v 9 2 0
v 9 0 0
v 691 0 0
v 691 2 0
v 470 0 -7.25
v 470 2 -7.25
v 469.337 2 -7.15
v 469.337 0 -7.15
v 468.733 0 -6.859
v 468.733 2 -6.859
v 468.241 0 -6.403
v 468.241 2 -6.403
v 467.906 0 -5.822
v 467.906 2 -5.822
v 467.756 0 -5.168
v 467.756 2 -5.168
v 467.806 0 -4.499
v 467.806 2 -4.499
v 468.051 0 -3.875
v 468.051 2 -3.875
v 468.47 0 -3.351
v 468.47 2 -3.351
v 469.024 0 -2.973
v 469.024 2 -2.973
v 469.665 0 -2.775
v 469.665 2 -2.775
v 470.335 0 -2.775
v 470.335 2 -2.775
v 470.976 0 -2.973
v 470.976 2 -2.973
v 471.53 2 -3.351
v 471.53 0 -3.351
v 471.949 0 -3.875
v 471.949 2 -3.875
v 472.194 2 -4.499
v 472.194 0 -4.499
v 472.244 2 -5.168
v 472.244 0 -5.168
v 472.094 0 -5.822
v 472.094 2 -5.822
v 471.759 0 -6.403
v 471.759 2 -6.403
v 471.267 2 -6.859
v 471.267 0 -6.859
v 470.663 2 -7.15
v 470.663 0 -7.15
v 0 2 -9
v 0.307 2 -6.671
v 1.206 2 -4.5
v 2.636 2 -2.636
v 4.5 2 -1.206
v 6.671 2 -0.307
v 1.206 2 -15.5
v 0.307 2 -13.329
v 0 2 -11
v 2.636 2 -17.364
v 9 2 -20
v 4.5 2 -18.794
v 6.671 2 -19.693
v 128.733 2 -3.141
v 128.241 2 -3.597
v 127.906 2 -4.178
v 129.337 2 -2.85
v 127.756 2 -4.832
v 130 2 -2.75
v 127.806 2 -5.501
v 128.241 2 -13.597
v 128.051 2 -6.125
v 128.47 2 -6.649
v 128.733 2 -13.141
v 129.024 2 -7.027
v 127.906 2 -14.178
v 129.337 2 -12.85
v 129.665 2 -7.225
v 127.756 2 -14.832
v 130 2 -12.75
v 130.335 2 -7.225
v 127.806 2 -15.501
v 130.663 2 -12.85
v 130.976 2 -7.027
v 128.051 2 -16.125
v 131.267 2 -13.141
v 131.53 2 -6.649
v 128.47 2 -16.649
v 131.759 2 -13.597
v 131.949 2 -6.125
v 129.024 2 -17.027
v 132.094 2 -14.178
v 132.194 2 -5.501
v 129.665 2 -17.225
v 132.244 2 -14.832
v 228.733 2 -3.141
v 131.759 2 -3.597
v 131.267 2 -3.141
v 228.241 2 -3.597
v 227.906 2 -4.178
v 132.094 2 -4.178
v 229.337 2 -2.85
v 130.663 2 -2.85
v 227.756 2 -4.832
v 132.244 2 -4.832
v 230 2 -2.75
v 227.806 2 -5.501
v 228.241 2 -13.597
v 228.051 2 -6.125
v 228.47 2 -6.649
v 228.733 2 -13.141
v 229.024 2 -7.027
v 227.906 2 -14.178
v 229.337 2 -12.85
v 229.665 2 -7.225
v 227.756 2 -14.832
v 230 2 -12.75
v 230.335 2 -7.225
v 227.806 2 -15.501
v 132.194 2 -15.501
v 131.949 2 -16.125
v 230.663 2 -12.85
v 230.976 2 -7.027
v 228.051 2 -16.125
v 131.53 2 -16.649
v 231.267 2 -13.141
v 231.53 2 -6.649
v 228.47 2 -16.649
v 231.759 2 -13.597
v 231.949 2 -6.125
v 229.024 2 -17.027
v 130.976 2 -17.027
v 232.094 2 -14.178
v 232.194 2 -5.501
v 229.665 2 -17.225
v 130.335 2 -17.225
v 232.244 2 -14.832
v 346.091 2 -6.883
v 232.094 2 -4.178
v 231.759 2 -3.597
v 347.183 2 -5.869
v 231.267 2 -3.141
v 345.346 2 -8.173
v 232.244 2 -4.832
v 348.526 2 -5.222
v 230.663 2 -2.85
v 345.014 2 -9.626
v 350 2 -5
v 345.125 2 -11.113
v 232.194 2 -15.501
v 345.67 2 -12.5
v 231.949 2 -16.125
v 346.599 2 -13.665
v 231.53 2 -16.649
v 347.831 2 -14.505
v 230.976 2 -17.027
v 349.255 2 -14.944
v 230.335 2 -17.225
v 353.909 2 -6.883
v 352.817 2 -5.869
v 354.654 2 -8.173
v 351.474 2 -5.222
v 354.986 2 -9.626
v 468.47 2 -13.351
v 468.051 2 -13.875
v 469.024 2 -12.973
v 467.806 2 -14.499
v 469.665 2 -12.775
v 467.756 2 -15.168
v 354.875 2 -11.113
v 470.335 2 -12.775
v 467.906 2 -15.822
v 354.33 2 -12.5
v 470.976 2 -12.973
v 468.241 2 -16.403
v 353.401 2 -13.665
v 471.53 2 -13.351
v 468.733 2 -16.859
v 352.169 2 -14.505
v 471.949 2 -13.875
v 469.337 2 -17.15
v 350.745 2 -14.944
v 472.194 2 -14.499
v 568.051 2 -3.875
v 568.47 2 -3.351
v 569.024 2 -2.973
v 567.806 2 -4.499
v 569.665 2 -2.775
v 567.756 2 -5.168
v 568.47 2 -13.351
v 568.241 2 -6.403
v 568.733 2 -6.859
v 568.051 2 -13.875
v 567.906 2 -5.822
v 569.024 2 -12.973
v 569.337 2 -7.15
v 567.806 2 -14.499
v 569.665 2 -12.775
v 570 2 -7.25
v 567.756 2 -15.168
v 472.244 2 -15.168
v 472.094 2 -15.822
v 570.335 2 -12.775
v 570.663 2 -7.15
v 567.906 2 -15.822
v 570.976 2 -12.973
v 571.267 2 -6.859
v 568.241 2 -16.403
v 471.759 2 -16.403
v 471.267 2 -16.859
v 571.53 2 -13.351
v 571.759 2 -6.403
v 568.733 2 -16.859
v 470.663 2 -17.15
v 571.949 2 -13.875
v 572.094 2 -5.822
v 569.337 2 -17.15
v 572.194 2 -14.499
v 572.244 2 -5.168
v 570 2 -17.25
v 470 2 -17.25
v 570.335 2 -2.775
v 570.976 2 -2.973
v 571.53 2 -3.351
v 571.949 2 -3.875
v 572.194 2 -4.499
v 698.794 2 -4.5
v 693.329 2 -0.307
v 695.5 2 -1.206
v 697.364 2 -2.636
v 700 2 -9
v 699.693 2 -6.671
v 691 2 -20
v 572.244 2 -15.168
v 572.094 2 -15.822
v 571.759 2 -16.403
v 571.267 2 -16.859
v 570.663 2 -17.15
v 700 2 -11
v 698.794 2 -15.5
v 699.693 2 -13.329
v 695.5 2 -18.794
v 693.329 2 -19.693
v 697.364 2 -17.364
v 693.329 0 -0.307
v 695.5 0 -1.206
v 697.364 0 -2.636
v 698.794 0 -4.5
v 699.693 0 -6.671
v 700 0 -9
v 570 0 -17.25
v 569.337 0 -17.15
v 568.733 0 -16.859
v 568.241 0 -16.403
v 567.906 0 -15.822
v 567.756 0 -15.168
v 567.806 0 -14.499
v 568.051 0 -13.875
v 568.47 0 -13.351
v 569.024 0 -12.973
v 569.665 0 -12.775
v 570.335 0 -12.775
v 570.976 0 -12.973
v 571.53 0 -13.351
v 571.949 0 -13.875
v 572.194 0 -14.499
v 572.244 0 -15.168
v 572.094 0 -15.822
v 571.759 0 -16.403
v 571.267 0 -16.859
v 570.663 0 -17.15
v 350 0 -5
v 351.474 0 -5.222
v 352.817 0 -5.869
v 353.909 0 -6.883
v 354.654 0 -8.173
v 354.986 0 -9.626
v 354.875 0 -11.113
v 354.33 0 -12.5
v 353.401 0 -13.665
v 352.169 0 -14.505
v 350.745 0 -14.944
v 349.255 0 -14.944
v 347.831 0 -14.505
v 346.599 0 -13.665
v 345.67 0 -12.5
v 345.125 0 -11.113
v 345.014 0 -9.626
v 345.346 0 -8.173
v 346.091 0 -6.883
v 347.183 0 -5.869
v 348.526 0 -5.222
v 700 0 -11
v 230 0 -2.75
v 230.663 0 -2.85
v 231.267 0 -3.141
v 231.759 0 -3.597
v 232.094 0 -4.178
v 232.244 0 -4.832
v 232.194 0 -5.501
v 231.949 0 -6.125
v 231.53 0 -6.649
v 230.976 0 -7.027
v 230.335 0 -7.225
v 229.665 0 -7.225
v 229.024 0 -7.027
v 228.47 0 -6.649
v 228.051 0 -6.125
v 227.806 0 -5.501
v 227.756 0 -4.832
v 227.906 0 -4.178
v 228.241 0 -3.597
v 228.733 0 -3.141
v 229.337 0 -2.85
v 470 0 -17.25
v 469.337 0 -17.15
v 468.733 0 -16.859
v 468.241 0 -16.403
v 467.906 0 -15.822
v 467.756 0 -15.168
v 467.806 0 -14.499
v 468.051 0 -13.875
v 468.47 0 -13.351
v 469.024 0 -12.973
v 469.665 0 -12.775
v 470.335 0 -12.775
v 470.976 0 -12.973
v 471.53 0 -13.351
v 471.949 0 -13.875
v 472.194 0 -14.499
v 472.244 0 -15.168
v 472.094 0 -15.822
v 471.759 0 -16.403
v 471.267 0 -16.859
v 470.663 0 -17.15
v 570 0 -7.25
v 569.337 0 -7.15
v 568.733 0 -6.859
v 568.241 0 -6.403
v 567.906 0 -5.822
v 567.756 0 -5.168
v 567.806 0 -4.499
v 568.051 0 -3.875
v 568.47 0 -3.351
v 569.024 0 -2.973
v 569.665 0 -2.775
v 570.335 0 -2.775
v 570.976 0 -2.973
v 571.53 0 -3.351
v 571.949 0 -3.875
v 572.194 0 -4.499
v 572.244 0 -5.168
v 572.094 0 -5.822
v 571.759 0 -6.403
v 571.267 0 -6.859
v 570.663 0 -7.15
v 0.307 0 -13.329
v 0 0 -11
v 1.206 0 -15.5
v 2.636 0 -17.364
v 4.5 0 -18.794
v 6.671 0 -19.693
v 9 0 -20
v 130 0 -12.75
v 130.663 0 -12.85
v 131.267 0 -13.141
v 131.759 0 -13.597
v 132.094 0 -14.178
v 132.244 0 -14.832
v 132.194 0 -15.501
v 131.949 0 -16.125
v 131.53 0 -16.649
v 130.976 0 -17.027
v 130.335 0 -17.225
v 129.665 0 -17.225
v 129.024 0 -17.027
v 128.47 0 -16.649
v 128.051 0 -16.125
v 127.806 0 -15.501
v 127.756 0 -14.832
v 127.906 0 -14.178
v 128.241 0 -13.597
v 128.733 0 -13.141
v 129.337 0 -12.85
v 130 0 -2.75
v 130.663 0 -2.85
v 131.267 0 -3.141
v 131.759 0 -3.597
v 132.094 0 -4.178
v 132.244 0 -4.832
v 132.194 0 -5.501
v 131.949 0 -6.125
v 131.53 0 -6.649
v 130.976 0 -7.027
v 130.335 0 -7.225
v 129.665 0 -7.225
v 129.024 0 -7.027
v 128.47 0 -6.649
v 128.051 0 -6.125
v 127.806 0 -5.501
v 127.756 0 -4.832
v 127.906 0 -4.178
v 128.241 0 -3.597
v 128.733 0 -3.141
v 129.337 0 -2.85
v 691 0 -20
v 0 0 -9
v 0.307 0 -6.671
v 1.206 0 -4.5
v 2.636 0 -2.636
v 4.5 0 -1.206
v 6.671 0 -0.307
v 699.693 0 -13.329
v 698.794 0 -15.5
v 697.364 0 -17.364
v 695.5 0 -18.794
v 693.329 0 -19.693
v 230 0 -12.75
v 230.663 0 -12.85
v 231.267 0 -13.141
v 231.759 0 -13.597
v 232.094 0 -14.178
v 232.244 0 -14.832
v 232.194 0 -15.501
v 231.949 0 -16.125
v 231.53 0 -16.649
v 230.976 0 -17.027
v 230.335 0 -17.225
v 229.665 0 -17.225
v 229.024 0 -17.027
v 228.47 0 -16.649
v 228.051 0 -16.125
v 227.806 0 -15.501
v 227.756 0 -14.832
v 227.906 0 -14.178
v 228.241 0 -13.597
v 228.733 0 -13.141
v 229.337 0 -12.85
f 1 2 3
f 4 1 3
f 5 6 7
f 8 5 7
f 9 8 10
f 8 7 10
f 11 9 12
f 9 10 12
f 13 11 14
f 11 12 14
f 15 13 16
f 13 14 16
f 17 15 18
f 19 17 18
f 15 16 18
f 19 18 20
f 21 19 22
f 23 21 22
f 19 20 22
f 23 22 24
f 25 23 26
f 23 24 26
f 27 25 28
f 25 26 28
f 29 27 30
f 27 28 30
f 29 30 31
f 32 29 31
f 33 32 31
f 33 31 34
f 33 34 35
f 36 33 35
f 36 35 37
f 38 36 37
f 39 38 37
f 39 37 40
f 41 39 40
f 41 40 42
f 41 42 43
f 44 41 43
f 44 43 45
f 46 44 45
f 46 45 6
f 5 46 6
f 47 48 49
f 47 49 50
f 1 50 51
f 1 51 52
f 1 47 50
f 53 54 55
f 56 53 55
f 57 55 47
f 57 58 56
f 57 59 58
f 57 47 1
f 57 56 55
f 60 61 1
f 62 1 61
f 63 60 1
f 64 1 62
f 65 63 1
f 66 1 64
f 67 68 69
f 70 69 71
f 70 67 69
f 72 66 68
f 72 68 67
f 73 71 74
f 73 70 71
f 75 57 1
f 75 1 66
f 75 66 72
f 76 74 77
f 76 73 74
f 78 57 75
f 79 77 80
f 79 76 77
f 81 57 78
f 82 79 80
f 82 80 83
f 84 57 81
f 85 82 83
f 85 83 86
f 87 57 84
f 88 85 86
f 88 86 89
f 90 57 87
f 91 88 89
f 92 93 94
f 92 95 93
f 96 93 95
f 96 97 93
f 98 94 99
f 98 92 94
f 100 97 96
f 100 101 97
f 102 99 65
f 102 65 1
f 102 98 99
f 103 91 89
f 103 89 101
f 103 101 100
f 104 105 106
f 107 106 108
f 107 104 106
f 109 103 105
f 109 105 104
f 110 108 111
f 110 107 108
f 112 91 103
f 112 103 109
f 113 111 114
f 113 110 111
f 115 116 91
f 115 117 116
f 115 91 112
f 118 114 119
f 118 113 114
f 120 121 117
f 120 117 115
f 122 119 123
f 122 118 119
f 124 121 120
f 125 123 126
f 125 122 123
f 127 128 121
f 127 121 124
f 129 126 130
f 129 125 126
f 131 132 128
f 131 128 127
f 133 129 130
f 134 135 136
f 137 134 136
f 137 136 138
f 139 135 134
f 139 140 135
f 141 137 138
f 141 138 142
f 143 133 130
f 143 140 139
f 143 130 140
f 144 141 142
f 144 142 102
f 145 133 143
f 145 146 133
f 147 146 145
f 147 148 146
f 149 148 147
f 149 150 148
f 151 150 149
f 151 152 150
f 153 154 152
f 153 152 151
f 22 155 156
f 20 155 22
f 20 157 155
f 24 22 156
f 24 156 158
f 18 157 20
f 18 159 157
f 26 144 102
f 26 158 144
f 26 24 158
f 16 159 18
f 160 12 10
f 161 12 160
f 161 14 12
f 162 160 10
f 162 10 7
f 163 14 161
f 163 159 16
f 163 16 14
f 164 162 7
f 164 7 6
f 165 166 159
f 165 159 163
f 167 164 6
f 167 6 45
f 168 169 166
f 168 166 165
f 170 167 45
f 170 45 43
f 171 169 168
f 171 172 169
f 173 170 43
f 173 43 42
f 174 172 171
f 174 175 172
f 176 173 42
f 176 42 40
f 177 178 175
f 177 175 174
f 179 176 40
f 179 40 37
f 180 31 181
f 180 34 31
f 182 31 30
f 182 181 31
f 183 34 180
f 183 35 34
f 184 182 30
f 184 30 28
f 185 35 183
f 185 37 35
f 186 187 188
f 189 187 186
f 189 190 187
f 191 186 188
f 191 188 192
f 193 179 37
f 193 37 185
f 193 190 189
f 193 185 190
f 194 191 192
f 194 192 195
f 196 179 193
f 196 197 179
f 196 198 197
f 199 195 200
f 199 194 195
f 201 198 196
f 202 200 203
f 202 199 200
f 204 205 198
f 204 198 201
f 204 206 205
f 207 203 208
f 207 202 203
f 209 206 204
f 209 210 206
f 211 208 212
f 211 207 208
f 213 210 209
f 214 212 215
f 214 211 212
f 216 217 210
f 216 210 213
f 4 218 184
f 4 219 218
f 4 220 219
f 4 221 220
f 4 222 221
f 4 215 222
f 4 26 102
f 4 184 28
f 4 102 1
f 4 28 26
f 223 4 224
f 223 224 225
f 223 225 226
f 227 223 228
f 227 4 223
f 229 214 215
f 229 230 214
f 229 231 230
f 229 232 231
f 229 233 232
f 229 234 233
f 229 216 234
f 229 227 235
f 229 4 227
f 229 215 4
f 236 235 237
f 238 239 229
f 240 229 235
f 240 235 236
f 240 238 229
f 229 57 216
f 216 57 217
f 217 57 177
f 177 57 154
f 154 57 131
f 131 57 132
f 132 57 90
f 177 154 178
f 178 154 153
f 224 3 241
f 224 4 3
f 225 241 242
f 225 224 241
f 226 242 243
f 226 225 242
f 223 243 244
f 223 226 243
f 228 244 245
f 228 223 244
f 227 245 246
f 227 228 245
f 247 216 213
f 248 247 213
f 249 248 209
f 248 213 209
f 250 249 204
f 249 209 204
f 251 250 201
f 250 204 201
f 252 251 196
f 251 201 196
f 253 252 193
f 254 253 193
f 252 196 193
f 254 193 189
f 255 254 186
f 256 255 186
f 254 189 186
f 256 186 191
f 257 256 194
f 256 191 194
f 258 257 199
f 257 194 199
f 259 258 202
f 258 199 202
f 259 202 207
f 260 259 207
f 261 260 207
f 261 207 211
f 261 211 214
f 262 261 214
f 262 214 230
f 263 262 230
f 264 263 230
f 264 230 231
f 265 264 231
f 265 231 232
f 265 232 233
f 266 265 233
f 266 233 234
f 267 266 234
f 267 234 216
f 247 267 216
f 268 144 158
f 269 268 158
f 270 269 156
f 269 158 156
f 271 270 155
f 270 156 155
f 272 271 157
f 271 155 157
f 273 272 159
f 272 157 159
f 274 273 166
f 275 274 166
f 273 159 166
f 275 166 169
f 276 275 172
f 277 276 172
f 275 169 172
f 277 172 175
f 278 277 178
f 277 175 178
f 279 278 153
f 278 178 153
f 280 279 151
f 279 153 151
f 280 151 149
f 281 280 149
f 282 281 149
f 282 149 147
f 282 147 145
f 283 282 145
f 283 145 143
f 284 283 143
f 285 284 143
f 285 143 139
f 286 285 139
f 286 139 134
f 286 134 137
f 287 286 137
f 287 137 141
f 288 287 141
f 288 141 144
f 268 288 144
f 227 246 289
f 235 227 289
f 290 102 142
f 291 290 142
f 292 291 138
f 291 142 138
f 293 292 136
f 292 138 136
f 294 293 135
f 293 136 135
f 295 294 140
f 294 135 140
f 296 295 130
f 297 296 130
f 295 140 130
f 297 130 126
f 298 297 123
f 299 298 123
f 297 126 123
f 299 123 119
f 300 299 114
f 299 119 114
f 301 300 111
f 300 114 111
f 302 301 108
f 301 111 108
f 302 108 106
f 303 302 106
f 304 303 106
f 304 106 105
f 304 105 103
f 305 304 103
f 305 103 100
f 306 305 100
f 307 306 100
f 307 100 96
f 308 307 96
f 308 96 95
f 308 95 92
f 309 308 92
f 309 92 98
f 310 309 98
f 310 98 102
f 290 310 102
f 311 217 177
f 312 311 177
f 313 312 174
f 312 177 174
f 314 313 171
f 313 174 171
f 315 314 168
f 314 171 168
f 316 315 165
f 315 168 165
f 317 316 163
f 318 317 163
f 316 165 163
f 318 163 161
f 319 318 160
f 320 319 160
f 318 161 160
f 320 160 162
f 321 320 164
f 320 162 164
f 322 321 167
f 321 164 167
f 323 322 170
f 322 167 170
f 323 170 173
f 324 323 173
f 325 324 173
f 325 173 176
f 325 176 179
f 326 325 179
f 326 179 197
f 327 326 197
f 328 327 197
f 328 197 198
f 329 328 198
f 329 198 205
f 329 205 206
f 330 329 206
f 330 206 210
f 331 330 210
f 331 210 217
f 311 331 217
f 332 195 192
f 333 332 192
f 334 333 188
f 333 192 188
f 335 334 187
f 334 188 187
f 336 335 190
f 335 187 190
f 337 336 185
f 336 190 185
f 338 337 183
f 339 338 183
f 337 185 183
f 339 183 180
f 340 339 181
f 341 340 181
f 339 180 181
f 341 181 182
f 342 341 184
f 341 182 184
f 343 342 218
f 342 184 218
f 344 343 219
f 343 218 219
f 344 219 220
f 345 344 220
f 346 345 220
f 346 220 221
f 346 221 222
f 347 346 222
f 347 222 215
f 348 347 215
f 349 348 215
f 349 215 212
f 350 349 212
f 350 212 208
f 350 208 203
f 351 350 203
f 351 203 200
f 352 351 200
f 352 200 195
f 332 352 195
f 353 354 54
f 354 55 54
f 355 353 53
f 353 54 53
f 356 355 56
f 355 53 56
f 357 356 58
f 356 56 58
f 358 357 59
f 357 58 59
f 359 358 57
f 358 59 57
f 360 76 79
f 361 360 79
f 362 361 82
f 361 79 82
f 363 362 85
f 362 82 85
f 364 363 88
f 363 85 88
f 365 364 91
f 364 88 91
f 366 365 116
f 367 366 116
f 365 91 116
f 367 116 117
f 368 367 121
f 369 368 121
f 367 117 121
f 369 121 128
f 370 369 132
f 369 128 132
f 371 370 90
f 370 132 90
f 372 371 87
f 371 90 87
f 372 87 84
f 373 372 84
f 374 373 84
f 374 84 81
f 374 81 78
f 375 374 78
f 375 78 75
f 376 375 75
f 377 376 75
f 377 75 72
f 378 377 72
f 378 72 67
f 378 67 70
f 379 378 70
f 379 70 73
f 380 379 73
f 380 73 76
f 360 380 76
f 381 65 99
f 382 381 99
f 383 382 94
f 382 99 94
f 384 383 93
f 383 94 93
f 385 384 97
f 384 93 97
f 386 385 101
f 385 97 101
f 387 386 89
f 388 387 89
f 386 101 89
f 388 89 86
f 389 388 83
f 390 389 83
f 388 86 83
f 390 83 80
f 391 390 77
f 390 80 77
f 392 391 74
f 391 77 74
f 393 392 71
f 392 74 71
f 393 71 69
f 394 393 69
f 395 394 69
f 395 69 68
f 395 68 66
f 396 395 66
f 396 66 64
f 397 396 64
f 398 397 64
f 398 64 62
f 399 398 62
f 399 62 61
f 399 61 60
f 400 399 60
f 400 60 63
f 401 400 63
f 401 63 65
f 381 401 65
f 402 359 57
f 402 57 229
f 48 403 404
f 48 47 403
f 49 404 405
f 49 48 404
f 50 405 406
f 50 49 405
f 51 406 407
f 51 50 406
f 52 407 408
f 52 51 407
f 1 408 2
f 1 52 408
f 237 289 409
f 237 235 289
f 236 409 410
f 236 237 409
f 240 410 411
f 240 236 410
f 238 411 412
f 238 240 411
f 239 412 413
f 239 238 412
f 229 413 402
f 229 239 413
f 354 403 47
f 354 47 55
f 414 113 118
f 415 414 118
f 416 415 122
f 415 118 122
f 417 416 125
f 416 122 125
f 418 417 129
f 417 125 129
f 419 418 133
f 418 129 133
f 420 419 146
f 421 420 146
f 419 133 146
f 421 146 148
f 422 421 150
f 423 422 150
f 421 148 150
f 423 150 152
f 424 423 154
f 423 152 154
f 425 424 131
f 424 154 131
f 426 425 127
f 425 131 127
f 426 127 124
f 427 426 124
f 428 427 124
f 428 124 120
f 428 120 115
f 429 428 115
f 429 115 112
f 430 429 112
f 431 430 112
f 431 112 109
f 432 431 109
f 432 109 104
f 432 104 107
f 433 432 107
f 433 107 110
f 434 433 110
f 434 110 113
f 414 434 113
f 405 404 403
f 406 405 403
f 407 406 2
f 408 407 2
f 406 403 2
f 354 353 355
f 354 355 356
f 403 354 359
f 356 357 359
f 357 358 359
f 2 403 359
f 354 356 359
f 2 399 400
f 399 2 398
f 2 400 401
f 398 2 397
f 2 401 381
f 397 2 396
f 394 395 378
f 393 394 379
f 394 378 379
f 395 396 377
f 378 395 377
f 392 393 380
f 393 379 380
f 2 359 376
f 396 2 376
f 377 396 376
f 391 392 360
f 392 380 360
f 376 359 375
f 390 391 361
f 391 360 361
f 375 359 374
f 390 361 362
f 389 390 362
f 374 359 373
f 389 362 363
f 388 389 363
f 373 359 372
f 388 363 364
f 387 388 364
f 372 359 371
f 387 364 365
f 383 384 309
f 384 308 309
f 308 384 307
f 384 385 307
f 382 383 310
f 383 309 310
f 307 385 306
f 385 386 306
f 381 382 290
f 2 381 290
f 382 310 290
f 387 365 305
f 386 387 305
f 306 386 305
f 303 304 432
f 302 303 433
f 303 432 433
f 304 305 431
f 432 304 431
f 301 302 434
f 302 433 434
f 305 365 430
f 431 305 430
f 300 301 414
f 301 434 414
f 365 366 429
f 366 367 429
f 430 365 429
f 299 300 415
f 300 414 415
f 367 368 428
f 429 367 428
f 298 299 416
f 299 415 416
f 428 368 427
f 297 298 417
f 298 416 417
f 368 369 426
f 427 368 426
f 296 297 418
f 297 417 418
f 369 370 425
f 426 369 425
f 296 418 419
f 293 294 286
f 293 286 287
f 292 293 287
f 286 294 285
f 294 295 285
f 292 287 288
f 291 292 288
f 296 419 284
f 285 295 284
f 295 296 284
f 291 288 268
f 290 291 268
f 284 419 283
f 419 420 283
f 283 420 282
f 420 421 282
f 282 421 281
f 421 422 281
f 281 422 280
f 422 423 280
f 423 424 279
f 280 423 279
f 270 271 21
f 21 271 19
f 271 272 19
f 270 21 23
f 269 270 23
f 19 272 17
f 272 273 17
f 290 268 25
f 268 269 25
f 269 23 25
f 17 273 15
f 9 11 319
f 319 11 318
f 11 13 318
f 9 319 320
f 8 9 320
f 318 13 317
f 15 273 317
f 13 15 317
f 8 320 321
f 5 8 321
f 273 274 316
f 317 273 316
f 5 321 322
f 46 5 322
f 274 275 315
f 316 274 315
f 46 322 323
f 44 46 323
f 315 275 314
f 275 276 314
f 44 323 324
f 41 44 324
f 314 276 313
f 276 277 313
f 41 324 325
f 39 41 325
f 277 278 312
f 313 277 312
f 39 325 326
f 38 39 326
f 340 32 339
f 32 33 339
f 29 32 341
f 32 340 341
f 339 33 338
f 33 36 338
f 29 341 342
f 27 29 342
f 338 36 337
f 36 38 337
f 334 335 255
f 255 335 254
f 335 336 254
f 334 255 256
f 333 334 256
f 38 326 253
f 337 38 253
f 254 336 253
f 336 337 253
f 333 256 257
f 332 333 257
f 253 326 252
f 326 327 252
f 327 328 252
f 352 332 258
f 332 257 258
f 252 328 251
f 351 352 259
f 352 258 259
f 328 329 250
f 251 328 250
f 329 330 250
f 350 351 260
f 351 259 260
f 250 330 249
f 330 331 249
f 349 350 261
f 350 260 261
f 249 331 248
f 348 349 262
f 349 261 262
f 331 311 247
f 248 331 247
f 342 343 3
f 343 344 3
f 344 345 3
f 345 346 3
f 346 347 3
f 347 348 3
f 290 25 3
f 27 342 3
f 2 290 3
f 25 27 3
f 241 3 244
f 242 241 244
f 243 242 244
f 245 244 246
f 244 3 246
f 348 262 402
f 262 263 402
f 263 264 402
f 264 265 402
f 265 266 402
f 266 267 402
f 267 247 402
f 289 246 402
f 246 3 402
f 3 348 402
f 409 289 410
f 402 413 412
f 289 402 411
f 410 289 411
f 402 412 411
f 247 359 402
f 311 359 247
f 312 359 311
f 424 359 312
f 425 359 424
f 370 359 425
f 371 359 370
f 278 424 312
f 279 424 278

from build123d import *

# Parameters (mm, degrees)
SKETCH1_W           = 700
SKETCH1_H           = 20
BOSS_EXTRUDE1_DEPTH = 2
FILLET1_R           = 9
SKETCH2_R           = 5
SKETCH2_R_2         = 2.25
CUT_EXTRUDE1_DEPTH  = 701.288511972


with BuildPart() as part:
    # Sketch1 → Boss-Extrude1 (new body)
    with BuildSketch(Plane(origin=(0, 0, 0), x_dir=(1, 0, 0), z_dir=(0, 1, 0))):
        with Locations((350, 10)):
            Rectangle(SKETCH1_W, SKETCH1_H)
    extrude(amount=BOSS_EXTRUDE1_DEPTH)

    # Fillet1
    fillet1_edges = [part.edges().sort_by_distance(p)[0] for p in [
        (0, 1, -20),
        (700, 1, -20),
        (700, 1, 0),
        (0, 1, 0),
    ]]
    fillet(fillet1_edges, radius=FILLET1_R)

    # Sketch2 → Cut-Extrude1 (cut, through all)
    with BuildSketch(Plane(origin=(0, 2, 0), x_dir=(1, 0, 0), z_dir=(0, 1, 0))):
        with Locations(Location((350, 10, 0), (0, 0, 270))):
            Circle(SKETCH2_R)
        with Locations(Location((130, 15, 0), (0, 0, 270))):
            Circle(SKETCH2_R_2)
        with Locations(Location((230, 15, 0), (0, 0, 270))):
            Circle(SKETCH2_R_2)
        with Locations(Location((130, 5, 0), (0, 0, 270))):
            Circle(SKETCH2_R_2)
        with Locations(Location((230, 5, 0), (0, 0, 270))):
            Circle(SKETCH2_R_2)
        with Locations(Location((470, 15, 0), (0, 0, 90))):
            Circle(SKETCH2_R_2)
        with Locations(Location((470, 5, 0), (0, 0, 90))):
            Circle(SKETCH2_R_2)
        with Locations(Location((570, 5, 0), (0, 0, 90))):
            Circle(SKETCH2_R_2)
        with Locations(Location((570, 15, 0), (0, 0, 90))):
            Circle(SKETCH2_R_2)
    extrude(amount=-CUT_EXTRUDE1_DEPTH, mode=Mode.SUBTRACT)


solid = part.part
